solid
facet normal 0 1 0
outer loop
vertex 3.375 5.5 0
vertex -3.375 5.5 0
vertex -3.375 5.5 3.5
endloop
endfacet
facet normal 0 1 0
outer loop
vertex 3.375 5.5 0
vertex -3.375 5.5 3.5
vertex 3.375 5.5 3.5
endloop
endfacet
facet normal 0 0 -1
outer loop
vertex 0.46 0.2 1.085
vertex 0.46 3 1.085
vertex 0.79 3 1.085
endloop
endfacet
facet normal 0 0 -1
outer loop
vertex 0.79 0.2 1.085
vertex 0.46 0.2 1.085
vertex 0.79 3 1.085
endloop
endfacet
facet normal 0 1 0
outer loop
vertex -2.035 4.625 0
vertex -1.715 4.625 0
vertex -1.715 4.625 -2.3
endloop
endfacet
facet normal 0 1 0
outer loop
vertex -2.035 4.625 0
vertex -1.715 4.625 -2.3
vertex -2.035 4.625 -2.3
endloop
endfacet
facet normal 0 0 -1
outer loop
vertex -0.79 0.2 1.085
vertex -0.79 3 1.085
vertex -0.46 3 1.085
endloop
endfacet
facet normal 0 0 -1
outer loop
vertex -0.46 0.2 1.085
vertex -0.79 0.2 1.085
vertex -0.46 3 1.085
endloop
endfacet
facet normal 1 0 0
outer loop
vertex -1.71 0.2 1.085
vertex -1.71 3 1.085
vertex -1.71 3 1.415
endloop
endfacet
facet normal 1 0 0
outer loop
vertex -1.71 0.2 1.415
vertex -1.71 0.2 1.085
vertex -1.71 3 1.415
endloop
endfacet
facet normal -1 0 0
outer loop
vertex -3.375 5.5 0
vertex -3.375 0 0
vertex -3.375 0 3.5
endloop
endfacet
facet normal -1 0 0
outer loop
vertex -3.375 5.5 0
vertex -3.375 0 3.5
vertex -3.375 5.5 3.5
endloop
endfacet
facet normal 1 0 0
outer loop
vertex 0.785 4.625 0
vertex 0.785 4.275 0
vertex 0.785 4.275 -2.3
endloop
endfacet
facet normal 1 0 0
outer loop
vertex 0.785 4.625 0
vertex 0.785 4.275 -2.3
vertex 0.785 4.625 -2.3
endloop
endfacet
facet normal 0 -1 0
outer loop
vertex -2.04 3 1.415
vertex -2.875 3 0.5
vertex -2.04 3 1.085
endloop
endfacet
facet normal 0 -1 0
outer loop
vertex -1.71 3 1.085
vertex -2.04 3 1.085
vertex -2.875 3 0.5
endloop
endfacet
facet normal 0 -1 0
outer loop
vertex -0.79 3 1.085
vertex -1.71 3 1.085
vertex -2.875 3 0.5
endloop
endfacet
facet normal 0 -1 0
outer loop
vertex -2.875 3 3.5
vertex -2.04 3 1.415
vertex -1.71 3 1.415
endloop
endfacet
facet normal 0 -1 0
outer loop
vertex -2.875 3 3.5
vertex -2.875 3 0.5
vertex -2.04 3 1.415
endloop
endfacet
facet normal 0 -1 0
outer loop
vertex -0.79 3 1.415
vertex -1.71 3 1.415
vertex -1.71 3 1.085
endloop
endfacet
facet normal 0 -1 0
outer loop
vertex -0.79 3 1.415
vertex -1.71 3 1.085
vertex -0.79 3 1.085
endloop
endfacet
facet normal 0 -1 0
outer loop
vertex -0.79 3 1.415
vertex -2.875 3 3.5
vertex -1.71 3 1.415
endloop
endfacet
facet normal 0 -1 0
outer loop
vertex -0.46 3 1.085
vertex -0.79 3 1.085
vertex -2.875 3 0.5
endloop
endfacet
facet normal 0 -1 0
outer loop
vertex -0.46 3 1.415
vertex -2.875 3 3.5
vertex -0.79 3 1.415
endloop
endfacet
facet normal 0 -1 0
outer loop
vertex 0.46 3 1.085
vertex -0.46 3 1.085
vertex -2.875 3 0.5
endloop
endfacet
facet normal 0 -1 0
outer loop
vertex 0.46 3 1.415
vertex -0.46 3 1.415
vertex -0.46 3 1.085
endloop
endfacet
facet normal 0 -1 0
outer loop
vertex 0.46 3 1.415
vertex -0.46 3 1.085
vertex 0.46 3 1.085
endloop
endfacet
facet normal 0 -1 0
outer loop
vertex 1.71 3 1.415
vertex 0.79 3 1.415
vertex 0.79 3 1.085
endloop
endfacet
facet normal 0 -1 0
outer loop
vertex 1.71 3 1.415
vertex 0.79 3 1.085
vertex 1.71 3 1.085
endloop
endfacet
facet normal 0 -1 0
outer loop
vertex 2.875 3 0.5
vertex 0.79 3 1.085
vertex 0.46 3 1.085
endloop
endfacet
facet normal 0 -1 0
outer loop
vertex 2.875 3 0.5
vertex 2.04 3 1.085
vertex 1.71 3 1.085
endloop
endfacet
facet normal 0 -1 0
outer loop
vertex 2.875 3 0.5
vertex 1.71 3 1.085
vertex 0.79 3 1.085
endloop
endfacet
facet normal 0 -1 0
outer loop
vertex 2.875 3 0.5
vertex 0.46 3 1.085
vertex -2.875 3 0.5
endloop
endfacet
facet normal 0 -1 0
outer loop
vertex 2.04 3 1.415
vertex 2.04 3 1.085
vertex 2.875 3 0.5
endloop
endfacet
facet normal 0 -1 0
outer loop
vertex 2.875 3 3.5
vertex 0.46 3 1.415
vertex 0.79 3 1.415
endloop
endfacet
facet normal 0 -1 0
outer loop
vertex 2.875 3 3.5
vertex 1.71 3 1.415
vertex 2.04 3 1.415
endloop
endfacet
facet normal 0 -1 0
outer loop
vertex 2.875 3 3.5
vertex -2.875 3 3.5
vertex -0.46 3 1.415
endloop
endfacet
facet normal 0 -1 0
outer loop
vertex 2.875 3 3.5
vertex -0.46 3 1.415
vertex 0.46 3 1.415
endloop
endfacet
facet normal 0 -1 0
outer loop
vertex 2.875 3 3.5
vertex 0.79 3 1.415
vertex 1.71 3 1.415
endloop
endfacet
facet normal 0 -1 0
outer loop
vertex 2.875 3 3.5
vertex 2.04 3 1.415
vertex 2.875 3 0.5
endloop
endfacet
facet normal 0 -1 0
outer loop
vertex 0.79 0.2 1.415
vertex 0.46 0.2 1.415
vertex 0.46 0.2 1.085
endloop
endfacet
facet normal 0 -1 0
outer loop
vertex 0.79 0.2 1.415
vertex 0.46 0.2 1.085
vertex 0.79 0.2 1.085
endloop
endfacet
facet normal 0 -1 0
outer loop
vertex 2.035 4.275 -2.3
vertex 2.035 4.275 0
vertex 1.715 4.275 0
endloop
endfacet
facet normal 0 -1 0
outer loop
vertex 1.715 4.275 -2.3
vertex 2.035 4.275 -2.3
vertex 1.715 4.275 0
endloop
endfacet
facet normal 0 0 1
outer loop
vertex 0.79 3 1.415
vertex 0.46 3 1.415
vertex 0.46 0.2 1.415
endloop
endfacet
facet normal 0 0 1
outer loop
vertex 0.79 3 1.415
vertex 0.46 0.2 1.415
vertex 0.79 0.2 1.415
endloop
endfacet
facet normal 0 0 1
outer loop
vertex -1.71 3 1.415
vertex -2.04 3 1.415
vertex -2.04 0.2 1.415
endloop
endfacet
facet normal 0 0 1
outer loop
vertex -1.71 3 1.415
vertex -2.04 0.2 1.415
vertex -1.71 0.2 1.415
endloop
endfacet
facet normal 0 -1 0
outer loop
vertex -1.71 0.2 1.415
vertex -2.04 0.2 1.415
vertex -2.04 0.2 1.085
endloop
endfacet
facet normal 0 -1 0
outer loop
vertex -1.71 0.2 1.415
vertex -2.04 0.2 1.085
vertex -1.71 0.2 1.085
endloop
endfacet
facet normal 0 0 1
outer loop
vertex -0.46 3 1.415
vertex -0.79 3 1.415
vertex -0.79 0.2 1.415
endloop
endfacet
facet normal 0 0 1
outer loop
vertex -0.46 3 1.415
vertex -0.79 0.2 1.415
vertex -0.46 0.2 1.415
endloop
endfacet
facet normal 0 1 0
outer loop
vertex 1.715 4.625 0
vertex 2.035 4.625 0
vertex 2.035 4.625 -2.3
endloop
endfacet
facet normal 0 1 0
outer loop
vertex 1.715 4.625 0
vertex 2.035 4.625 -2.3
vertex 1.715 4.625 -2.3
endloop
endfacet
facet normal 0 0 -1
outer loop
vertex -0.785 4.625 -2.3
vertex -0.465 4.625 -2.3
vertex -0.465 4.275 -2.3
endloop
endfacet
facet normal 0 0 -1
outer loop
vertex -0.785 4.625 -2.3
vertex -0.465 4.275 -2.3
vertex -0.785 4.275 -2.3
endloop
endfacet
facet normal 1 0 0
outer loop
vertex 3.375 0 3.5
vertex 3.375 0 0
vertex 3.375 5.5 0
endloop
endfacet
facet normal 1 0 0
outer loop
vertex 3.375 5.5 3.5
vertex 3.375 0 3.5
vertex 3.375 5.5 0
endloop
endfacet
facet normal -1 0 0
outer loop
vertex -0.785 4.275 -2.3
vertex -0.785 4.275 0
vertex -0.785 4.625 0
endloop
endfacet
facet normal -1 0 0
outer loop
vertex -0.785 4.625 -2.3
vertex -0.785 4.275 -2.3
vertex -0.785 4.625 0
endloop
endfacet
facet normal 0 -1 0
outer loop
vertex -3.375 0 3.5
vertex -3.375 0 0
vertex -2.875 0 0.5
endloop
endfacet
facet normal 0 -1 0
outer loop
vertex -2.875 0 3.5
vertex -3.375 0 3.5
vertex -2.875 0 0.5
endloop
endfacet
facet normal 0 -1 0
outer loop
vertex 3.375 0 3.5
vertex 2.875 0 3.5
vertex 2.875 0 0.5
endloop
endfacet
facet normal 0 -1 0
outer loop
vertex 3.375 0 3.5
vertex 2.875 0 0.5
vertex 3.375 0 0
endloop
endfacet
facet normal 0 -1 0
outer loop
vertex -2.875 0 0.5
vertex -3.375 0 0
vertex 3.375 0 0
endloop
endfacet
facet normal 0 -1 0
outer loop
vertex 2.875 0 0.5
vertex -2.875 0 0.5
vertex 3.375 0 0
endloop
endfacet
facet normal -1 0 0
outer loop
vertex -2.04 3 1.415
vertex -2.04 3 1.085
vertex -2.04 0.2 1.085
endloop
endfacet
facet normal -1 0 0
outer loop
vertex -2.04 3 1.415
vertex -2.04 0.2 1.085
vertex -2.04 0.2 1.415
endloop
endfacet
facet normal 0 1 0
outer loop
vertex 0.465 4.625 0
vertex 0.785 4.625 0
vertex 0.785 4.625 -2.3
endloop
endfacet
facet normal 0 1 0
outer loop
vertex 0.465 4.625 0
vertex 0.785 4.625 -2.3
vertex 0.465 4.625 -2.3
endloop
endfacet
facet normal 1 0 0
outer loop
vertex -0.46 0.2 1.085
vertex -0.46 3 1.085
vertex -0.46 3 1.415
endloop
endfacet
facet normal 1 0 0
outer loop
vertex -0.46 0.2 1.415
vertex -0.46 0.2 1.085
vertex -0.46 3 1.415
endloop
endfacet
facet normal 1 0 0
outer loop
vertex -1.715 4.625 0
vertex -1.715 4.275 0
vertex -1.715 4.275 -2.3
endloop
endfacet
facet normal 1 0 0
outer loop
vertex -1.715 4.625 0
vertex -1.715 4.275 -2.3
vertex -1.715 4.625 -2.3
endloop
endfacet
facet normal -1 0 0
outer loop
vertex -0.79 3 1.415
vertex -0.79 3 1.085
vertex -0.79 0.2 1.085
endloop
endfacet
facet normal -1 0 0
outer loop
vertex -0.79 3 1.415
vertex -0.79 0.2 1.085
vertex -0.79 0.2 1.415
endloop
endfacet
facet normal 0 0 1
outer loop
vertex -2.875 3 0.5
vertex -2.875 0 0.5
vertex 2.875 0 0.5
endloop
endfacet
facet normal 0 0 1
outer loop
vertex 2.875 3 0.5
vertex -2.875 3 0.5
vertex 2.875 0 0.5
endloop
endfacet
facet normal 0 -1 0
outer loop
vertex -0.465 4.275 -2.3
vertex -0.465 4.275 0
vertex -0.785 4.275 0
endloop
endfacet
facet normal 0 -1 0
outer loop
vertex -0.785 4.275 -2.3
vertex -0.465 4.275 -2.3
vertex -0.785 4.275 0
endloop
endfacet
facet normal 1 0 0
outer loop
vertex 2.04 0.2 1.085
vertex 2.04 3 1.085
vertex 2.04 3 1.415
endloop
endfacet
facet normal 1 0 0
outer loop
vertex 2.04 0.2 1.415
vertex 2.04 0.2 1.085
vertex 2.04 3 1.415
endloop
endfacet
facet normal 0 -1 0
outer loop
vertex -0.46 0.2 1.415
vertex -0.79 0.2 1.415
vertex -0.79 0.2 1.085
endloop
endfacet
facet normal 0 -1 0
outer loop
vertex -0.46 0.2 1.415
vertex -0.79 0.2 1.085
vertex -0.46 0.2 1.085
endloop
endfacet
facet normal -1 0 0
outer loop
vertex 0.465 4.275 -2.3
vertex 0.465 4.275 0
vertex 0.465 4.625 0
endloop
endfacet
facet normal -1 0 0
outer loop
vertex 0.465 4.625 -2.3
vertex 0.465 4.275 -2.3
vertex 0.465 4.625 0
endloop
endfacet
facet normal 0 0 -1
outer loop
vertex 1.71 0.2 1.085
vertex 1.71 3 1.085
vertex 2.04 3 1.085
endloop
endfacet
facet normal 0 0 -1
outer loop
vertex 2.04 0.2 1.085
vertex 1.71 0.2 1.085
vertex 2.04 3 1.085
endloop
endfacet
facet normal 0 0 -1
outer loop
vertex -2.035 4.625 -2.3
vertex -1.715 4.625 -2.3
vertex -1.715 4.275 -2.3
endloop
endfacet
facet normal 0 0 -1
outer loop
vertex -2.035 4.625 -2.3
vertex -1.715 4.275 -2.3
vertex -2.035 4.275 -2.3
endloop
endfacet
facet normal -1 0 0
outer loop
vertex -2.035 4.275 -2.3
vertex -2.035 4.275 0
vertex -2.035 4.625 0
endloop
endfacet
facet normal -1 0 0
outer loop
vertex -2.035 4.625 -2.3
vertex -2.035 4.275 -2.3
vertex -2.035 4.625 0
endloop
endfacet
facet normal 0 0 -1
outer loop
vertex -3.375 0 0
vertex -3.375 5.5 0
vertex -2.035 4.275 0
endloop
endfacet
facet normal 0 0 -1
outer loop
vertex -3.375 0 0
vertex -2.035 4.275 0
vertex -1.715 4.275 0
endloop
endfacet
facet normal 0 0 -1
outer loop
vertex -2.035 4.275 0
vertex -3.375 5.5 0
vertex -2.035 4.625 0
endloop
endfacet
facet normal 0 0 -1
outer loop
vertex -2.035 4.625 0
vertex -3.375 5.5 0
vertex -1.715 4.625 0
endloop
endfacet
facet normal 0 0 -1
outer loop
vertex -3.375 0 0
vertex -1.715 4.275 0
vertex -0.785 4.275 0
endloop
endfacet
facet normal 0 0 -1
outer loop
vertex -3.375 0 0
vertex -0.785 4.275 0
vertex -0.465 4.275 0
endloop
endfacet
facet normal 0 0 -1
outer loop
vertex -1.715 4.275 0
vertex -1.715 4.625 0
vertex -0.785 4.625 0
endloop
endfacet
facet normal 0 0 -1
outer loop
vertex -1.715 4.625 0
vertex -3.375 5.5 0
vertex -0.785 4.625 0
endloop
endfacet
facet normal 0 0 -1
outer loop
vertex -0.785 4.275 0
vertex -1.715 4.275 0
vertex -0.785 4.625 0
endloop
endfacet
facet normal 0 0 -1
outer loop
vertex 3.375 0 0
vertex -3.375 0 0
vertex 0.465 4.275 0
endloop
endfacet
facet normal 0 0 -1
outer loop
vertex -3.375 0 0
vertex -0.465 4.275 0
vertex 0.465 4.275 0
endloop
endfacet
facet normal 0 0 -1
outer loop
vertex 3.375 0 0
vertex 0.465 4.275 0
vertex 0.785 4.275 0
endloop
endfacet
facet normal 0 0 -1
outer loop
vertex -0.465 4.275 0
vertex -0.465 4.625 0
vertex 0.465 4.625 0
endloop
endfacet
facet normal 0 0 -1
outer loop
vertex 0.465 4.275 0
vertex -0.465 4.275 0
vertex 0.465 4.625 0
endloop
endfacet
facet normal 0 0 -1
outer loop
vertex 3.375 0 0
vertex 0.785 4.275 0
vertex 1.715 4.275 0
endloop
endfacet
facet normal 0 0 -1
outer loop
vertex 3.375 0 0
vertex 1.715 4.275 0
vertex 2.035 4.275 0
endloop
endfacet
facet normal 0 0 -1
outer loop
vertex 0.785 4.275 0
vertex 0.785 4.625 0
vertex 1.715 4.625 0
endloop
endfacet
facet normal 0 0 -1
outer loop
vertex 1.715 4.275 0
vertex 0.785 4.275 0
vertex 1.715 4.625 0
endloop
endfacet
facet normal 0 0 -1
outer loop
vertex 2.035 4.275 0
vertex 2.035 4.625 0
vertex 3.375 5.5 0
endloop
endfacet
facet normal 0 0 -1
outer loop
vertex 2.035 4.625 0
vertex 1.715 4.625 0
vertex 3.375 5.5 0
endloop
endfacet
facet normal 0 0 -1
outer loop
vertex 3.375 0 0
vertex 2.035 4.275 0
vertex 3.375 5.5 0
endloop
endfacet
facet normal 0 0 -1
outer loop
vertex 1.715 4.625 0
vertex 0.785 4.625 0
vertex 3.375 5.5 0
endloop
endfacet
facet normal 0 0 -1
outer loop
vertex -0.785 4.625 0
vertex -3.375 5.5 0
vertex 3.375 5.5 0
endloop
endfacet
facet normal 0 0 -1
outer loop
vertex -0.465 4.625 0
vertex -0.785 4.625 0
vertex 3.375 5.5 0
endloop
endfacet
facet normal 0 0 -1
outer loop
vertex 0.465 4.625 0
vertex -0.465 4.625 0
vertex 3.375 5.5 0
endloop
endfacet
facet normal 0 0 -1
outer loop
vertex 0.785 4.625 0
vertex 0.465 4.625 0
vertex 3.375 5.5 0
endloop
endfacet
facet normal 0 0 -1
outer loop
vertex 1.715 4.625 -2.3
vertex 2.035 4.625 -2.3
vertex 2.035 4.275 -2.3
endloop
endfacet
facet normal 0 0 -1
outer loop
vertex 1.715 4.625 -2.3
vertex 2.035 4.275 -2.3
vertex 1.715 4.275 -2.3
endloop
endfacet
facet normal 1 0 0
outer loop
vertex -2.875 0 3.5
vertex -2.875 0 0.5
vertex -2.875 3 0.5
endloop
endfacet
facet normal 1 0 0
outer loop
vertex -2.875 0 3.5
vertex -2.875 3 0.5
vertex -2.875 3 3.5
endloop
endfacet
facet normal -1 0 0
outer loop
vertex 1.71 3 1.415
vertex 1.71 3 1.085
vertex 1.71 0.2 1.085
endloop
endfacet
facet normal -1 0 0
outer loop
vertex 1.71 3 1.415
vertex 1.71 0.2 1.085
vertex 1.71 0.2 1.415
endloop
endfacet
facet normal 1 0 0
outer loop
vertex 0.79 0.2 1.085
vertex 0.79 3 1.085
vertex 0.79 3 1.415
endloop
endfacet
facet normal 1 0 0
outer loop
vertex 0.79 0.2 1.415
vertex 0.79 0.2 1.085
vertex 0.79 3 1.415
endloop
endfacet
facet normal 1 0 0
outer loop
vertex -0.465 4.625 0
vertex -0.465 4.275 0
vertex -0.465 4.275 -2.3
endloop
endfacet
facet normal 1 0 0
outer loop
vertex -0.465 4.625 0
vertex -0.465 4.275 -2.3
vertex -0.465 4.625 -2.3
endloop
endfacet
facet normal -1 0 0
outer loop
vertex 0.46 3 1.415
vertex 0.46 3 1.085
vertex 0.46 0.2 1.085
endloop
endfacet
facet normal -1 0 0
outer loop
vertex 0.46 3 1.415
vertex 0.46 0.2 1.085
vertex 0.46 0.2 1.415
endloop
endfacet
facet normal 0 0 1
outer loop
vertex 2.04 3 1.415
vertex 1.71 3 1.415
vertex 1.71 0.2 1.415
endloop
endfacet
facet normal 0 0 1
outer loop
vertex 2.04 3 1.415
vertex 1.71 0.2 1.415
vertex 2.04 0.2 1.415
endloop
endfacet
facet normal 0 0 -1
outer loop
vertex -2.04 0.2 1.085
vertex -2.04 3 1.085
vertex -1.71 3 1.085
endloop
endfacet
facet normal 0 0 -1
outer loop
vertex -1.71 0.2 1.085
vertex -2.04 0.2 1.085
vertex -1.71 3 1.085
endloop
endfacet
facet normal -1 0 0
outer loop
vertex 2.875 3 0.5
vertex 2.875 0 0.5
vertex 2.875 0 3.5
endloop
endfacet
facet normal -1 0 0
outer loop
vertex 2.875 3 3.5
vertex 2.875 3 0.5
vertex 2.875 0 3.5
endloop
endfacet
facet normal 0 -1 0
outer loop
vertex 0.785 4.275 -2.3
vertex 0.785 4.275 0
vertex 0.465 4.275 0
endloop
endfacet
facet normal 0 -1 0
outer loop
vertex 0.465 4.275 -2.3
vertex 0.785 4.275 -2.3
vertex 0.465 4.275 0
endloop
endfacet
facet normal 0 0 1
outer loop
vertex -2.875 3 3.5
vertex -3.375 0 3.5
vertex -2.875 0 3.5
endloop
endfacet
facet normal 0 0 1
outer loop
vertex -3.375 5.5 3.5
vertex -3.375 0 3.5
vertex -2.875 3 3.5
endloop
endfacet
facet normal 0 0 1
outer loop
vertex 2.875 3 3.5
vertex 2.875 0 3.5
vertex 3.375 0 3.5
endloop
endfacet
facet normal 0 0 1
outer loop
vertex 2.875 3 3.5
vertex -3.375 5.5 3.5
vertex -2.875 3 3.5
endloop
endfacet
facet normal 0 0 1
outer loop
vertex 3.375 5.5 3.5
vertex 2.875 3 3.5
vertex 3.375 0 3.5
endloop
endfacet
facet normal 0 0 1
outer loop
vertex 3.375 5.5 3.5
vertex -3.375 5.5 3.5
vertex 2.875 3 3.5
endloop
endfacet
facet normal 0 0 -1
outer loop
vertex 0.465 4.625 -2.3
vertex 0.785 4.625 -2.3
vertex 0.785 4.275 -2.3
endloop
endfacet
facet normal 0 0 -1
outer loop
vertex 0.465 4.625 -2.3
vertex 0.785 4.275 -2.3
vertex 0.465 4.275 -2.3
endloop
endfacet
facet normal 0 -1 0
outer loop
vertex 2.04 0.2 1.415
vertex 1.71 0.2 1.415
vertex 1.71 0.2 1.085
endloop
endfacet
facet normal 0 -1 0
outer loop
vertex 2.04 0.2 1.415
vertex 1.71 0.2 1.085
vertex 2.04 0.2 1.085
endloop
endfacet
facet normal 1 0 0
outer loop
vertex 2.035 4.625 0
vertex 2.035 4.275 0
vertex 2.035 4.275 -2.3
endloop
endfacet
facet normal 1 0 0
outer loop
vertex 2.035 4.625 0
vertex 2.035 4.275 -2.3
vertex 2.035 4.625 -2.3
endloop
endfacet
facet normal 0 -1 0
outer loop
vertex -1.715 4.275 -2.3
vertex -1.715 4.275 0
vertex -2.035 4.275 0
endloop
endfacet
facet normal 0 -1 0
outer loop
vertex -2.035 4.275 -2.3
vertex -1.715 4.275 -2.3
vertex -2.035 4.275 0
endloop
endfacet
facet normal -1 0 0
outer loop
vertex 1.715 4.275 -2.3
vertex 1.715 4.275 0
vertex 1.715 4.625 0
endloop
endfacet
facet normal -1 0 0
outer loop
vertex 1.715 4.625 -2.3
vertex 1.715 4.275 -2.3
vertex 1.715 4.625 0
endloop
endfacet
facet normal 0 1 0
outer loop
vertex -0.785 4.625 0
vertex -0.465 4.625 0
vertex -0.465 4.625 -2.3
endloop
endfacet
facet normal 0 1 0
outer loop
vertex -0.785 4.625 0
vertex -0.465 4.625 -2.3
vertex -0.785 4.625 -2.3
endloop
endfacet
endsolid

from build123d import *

# Parameters (mm, degrees)
SKETCH_1_W                 = 6.75
SKETCH_1_H                 = 5.5
EXTRUDE_1_DEPTH            = 3.5
SKETCH_2_W                 = 0.32
SKETCH_2_H                 = 0.35
EXTRUDE_2_DEPTH            = 2.3
SKETCH_3_W                 = 5.75
SKETCH_3_H                 = 3
CUT_EXTRUDE_1_DEPTH        = 3
SKETCH_4_W                 = 0.33
SKETCH_4_H                 = 0.33
EXTRUDE_3_DEPTH            = 2.8
PATTERN_LINEAR_3_COUNT     = 2
PATTERN_LINEAR_3_PITCH     = 1.25
PATTERN_LINEAR_3_COL_COUNT = 3
PATTERN_LINEAR_3_COL_PITCH = 1.25


with BuildPart() as part:
    # Эскиз1 → Бобышка-Вытянуть1 (new body)
    with BuildSketch(Plane.XY):
        with Locations((0, 2.75)):
            Rectangle(SKETCH_1_W, SKETCH_1_H)
    extrude(amount=EXTRUDE_1_DEPTH)

    # Эскиз2 → Бобышка-Вытянуть2 (add)
    with BuildSketch(Plane(origin=(0, 0, 0), x_dir=(-1, 0, 0), z_dir=(0, 0, -1))):
        with Locations((-0.625, 4.45)):
            Rectangle(SKETCH_2_W, SKETCH_2_H)
    extrude_2 = extrude(amount=EXTRUDE_2_DEPTH)

    # Эскиз3 → Вырез-Вытянуть1 (cut)
    with BuildSketch(Plane.XZ):
        with Locations((0, 2)):
            Rectangle(SKETCH_3_W, SKETCH_3_H)
    extrude(amount=-CUT_EXTRUDE_1_DEPTH, mode=Mode.SUBTRACT)

    # Эскиз4 → Бобышка-Вытянуть3 (add)
    with BuildSketch(Plane.XZ.offset(-3)):
        with Locations((0.625, 1.25)):
            Rectangle(SKETCH_4_W, SKETCH_4_H)
    extrude_3 = extrude(amount=EXTRUDE_3_DEPTH)

    # Линейный массив3: Бобышка-Вытянуть2, Бобышка-Вытянуть3 ×2
    with Locations(*[(i * PATTERN_LINEAR_3_PITCH, 0, 0) for i in range(1, PATTERN_LINEAR_3_COUNT)]):
        add(extrude_2)
        add(extrude_3)

    # Линейный массив3 col: Бобышка-Вытянуть2, Бобышка-Вытянуть3 ×3
    with Locations(*[(-i * PATTERN_LINEAR_3_COL_PITCH, 0, 0) for i in range(1, PATTERN_LINEAR_3_COL_COUNT)]):
        add(extrude_2)
        add(extrude_3)


solid = part.part
